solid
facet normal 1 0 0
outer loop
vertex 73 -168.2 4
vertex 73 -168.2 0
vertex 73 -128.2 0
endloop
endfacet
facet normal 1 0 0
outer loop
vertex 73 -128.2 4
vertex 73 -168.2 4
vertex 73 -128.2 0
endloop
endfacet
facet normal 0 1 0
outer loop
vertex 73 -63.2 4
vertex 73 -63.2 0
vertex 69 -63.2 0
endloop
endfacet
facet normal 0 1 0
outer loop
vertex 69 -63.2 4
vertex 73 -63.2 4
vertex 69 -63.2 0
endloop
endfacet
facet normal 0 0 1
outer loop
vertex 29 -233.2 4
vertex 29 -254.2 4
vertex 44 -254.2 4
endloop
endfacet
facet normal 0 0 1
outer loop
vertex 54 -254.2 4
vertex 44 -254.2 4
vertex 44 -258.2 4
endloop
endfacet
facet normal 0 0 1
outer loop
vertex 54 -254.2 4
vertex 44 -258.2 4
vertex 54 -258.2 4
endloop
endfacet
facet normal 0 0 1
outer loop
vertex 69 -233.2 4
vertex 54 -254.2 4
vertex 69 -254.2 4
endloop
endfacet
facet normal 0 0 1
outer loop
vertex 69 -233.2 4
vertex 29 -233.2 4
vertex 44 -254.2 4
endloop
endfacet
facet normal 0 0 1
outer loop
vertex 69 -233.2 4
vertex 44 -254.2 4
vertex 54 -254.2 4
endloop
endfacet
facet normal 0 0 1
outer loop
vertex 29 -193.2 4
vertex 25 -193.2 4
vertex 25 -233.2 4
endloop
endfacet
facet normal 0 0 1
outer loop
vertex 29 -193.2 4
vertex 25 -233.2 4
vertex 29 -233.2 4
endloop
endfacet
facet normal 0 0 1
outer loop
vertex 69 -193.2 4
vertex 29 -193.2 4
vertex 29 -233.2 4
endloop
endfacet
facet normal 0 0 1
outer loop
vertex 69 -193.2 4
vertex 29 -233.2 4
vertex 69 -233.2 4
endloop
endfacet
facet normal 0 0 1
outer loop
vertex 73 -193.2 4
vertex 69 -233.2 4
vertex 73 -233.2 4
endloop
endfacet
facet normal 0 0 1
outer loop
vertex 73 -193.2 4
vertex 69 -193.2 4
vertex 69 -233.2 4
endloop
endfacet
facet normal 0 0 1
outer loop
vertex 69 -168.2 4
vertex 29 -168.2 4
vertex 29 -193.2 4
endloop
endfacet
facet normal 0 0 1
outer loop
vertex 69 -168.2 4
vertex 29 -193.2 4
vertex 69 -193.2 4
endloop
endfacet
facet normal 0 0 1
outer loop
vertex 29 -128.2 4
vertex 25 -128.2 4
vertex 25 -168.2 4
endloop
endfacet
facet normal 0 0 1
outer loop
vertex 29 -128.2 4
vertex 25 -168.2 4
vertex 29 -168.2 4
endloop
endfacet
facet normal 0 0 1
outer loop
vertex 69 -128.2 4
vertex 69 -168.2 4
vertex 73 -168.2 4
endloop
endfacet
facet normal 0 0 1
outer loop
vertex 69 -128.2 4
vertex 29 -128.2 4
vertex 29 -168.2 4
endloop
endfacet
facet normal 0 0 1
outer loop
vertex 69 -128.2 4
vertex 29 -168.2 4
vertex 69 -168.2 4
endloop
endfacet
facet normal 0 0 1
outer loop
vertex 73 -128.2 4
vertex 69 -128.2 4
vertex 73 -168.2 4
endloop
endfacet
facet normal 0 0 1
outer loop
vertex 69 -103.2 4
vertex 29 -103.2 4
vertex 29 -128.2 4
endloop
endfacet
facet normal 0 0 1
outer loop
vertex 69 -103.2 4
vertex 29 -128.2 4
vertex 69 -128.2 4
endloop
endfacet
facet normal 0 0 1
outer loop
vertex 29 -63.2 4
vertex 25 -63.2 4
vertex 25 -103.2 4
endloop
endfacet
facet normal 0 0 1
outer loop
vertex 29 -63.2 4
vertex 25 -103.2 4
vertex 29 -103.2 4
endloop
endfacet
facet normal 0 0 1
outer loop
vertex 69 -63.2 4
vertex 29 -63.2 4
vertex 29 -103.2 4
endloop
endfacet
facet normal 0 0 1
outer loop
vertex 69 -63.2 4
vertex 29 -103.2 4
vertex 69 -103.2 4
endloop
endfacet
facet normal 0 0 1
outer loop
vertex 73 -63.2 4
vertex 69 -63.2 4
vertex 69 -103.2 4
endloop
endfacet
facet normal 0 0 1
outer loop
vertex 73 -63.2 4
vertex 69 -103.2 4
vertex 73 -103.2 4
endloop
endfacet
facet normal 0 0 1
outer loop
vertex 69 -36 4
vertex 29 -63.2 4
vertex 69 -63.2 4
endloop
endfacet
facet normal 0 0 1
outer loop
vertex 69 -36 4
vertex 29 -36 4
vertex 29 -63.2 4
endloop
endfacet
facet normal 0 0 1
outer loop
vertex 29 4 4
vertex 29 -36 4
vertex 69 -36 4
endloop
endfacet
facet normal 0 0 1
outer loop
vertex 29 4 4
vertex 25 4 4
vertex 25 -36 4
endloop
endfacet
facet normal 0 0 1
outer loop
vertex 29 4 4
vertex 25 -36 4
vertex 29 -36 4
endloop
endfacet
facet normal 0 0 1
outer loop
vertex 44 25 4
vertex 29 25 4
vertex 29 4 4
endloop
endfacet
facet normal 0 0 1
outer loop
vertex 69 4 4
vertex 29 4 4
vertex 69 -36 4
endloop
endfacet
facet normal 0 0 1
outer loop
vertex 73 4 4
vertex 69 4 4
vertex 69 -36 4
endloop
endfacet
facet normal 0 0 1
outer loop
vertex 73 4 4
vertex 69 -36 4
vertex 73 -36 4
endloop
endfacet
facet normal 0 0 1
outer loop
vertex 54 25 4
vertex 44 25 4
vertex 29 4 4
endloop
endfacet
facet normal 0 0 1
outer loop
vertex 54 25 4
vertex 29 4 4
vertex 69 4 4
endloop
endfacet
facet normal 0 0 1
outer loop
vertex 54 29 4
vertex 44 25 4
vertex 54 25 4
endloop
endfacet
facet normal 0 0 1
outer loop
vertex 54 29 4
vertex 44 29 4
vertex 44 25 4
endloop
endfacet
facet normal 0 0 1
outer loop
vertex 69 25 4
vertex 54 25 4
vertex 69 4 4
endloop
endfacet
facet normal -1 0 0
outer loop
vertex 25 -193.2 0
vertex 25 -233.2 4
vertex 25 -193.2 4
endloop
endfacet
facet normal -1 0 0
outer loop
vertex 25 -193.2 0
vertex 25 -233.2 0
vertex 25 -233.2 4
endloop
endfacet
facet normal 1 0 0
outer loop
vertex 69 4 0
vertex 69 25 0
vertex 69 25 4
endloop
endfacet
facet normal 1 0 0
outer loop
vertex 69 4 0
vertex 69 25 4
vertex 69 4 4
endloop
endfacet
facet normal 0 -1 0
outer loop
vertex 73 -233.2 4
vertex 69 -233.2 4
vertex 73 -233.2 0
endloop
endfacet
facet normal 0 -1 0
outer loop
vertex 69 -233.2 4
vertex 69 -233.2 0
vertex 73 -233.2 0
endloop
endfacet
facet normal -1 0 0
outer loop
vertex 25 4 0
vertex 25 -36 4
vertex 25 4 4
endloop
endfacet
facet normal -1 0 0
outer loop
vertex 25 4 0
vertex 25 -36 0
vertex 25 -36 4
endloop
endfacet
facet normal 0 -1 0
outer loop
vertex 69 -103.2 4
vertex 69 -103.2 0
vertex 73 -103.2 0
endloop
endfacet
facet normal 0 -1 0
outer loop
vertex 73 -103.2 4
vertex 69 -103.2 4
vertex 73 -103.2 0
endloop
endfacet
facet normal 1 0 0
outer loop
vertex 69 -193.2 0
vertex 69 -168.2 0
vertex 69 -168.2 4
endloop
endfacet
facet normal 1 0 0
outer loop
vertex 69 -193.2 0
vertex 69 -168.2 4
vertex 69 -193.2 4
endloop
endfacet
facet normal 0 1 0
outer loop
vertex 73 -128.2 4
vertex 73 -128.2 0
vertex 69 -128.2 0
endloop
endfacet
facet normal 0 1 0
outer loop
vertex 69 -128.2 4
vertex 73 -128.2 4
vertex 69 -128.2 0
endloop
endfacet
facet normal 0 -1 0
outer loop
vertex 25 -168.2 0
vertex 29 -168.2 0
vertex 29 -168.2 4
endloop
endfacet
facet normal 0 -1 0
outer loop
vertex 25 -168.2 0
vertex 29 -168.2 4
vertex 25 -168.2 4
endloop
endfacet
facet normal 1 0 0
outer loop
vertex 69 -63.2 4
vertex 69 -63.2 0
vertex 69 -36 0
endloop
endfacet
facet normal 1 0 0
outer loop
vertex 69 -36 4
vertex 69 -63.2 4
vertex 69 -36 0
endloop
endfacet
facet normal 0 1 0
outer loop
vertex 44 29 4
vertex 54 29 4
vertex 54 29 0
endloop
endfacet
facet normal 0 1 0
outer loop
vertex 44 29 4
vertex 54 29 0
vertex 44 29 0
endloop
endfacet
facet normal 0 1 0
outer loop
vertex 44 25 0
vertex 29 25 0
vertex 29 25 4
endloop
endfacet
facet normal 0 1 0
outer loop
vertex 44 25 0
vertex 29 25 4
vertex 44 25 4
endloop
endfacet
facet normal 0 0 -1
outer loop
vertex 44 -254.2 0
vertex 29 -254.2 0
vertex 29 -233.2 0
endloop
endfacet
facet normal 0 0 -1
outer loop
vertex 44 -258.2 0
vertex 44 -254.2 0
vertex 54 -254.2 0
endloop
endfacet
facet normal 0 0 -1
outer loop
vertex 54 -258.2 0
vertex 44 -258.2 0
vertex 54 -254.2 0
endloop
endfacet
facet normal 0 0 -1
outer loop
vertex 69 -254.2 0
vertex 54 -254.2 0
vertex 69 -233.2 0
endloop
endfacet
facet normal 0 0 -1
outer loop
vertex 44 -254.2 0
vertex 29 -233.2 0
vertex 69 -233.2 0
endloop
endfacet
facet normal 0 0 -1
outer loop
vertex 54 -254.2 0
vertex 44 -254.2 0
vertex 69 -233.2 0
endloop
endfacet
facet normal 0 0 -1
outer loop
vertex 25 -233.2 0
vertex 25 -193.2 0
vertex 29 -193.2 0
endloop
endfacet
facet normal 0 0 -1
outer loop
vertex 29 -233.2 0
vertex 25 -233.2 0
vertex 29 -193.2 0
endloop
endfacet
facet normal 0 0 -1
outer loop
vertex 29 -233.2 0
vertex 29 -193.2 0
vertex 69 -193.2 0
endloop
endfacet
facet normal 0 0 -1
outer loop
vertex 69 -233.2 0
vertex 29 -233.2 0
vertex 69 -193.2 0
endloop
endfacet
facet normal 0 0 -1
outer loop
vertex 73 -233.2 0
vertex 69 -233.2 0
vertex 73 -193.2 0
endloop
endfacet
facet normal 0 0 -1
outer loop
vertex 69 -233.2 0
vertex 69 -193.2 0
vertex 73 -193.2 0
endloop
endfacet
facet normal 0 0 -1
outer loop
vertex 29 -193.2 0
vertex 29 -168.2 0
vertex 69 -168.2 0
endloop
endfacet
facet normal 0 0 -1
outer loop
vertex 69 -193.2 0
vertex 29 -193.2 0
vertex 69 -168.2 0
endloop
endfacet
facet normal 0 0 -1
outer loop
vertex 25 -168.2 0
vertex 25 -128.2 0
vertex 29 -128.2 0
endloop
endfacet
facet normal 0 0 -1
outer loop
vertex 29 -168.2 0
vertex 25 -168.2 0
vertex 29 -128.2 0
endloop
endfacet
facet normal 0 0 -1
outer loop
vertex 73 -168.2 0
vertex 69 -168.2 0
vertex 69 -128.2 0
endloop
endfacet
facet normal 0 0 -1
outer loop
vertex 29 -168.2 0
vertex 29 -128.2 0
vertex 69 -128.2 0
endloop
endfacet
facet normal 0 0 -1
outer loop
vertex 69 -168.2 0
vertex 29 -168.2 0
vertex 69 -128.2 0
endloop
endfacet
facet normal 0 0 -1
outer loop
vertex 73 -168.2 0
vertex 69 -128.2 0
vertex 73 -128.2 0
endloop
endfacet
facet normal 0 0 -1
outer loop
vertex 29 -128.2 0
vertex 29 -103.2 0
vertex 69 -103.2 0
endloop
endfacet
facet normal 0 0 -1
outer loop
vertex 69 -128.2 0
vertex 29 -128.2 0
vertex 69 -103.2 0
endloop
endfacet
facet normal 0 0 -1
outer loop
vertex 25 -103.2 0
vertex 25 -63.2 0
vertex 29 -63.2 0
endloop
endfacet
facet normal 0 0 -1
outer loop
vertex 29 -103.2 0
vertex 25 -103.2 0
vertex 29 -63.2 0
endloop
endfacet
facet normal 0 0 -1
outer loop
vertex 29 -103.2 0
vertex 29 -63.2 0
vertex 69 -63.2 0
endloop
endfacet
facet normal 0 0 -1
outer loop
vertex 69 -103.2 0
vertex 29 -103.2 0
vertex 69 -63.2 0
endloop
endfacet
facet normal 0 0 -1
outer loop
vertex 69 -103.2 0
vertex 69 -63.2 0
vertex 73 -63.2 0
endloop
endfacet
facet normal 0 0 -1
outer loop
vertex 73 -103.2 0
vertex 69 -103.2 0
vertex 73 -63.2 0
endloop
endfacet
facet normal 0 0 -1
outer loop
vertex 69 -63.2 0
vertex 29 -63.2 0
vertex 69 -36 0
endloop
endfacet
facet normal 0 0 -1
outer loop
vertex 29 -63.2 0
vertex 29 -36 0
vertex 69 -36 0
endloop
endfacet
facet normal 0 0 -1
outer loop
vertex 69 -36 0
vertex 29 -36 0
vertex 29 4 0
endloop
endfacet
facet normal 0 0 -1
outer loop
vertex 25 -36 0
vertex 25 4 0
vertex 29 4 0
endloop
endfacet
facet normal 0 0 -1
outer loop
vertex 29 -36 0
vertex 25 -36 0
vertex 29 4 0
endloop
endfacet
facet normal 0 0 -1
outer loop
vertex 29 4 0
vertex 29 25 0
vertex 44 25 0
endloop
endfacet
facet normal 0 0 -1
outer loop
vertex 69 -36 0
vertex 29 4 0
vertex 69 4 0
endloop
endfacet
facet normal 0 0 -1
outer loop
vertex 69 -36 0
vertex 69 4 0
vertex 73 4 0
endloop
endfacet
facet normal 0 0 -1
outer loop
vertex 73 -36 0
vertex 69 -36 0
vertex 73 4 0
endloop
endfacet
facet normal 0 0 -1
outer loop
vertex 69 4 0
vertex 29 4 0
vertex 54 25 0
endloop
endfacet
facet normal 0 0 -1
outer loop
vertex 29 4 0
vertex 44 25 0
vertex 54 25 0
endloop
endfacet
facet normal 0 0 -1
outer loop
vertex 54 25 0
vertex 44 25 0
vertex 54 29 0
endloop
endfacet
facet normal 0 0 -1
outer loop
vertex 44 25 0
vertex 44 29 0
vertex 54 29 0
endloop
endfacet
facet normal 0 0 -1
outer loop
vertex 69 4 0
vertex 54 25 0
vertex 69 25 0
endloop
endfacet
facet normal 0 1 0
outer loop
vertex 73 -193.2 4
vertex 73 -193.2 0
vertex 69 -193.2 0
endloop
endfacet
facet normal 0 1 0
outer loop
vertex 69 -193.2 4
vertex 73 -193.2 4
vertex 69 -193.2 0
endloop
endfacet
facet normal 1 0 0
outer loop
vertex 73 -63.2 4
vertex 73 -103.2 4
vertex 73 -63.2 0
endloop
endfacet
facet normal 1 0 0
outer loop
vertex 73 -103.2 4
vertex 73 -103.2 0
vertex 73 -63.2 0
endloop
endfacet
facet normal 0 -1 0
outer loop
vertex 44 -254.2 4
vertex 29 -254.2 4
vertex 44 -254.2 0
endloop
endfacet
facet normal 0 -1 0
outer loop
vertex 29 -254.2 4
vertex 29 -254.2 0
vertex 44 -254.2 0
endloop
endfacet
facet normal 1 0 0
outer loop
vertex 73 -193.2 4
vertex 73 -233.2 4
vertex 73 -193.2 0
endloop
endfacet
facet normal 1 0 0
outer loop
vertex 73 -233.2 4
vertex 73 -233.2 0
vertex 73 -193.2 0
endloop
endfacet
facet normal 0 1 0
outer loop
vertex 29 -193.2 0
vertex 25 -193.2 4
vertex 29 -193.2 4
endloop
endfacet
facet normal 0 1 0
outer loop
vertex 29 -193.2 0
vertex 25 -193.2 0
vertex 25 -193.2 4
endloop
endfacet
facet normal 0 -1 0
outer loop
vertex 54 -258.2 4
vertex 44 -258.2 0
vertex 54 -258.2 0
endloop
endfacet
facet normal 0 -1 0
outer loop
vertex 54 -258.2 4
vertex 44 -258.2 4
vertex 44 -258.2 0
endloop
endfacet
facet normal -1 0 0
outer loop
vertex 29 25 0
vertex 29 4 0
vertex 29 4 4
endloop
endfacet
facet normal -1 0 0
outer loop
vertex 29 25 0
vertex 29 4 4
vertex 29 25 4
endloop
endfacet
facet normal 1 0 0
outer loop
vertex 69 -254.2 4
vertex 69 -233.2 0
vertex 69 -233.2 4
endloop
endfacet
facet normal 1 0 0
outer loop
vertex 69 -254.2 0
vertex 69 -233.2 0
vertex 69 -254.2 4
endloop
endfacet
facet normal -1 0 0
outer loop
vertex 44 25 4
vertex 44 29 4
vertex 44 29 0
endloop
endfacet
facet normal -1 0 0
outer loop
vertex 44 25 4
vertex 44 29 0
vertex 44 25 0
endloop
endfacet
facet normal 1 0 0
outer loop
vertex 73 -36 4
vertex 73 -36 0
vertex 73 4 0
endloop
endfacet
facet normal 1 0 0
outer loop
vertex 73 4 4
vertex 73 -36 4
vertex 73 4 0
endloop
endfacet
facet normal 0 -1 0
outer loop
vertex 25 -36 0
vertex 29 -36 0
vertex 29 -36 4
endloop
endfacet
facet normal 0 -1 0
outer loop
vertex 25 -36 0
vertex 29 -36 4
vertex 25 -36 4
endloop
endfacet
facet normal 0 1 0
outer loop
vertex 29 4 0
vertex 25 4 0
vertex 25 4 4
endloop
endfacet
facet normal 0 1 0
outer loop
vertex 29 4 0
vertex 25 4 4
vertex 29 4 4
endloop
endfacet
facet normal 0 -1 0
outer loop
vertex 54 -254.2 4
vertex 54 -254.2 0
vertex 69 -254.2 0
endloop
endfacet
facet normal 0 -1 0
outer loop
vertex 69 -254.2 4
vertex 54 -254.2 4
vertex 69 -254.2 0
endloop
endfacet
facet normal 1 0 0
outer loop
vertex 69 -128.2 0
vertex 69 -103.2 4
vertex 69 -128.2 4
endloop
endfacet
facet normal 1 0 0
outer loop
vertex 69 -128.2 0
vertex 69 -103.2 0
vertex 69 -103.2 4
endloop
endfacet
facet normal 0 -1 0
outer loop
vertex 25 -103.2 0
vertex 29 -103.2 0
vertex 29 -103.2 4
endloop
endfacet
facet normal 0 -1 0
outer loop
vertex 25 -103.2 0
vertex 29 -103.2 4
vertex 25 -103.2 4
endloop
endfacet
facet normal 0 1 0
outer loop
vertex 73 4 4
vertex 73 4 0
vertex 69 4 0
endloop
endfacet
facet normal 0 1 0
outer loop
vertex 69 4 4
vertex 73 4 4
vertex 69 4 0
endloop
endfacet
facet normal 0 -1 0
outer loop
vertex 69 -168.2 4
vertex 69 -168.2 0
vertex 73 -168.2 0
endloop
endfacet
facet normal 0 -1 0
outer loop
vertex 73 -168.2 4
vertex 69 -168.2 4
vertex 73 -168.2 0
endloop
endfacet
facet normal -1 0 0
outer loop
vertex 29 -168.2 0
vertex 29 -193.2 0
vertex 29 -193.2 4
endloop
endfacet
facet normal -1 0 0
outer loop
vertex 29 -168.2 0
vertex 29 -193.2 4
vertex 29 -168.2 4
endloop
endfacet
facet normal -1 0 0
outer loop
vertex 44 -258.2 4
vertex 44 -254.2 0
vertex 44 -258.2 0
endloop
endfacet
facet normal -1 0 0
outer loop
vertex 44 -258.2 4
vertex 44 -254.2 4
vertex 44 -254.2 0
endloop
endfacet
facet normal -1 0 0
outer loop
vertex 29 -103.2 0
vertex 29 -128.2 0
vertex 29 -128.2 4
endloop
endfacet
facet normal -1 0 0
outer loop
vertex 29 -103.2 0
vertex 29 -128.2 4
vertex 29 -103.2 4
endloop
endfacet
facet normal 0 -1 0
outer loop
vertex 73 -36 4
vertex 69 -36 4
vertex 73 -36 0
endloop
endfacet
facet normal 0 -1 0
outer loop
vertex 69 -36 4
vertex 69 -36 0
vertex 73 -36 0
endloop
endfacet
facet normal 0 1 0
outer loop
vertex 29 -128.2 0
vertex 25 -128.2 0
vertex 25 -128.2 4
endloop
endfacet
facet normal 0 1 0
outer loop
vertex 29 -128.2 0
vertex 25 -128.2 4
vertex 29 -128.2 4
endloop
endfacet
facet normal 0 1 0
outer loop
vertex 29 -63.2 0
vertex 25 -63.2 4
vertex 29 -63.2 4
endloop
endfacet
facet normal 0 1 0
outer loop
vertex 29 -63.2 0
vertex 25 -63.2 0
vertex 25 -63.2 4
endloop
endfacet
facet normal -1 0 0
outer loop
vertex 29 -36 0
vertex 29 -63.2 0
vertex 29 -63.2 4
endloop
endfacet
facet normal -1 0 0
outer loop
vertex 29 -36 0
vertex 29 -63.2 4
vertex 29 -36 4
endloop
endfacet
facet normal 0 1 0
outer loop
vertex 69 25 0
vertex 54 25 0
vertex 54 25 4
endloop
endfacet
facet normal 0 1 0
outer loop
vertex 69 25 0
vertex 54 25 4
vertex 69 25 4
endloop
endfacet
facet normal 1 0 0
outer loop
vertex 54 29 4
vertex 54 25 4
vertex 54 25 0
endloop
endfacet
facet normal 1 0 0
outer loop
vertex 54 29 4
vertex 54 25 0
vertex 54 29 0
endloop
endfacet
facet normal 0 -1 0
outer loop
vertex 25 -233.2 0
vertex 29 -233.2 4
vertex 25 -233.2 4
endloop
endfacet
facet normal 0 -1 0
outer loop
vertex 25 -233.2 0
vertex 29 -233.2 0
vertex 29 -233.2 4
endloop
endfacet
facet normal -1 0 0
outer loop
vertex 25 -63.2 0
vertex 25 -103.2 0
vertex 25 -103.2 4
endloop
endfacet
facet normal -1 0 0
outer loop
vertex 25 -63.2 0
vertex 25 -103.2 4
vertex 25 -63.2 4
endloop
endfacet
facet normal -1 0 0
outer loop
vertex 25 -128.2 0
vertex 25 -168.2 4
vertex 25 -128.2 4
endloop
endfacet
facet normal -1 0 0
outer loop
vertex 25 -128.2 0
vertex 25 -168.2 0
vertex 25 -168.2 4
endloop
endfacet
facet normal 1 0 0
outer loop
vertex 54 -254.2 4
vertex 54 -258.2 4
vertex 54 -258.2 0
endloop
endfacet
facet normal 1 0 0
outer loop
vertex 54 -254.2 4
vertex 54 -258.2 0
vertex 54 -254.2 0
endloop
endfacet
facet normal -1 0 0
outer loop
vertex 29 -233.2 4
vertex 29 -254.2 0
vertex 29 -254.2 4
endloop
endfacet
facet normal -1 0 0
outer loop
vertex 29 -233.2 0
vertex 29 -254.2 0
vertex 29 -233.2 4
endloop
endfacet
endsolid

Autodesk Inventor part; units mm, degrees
ref_plane "YZ Plane" through (0, 0, 0) normal (1, 0, 0) x (0, 1, 0)
ref_plane "XZ Plane" through (0, 0, 0) normal (0, 1, 0) x (-1, 0, 0)
sketch "Sketch1" plane through (0, 0, 0) normal (0, 0, 1) x (1, 0, 0)
  line L0 (29, -258.2) -> (29, -233.2)
  line L1 (29, -233.2) -> (25, -233.2)
  line L2 (25, -233.2) -> (25, -193.2)
  line L3 (25, -193.2) -> (29, -193.2)
  line L4 (29, -193.2) -> (29, -168.2)
  line L5 (29, -168.2) -> (25, -168.2)
  line L6 (25, -168.2) -> (25, -128.2)
  line L7 (25, -128.2) -> (29, -128.2)
  line L8 (29, -128.2) -> (29, -103.2)
  line L9 (29, -103.2) -> (25, -103.2)
  line L10 (25, -103.2) -> (25, -63.2)
  line L11 (25, -63.2) -> (29, -63.2)
  line L12 (29, -63.2) -> (29, -36)
  line L13 (29, -36) -> (25, -36)
  line L14 (25, -36) -> (25, 4)
  line L15 (25, 4) -> (29, 4)
  line L16 (29, 4) -> (29, 29)
  line L17 (29, 29) -> (29, 25)
  line L18 (29, 25) -> (69, 25)
  line L19 (29, -258.2) -> (29, -254.2)
  line L20 (29, -254.2) -> (69, -254.2)
  line L21 (49, 25) -> (49, 50.1757)
  line L22 (69, -63.2) -> (69, -36)
  line L23 (73, -36) -> (73, 4)
  line L24 (69, -36) -> (73, -36)
  line L25 (73, 4) -> (69, 4)
  line L26 (73, -233.2) -> (73, -193.2)
  line L27 (73, -193.2) -> (69, -193.2)
  line L28 (69, -233.2) -> (73, -233.2)
  line L29 (69, -168.2) -> (73, -168.2)
  line L30 (73, -168.2) -> (73, -128.2)
  line L31 (73, -63.2) -> (69, -63.2)
  line L32 (69, -103.2) -> (73, -103.2)
  line L33 (73, -128.2) -> (69, -128.2)
  line L34 (73, -103.2) -> (73, -63.2)
  line L35 (69, 25) -> (69, 4)
  line L36 (69, -36) -> (69, -63.2)
  line L37 (69, -103.2) -> (69, -128.2)
  line L38 (69, -168.2) -> (69, -193.2)
  line L39 (69, -233.2) -> (69, -254.2)
  point P0 (0, 0)
  dimension "d1" = 40
  dimension "d2" = 4
  dimension "d3" = 40
  dimension "d4" = 40
  dimension "d5" = 40
  dimension "d6" = 40
  dimension "d7" = 279.2
extrude "Extrusion1" add sketch "Sketch1" along normal blind 4
sketch "Sketch2" plane through (0, 0, 4) normal (0, 0, 1) x (1, 0, 0)
  line L0 (25, -63.2) -> (25, -103.2) projected
  line L1 (25, -103.2) -> (29, -103.2) projected
  line L2 (29, -103.2) -> (29, -128.2) projected
  line L3 (29, -128.2) -> (25, -128.2) projected
  line L4 (25, -128.2) -> (25, -168.2) projected
  line L5 (25, -168.2) -> (29, -168.2) projected
  line L6 (29, -168.2) -> (29, -193.2) projected
  line L7 (29, -193.2) -> (25, -193.2) projected
  line L8 (25, -193.2) -> (25, -233.2) projected
  line L9 (25, -233.2) -> (29, -233.2) projected
  line L10 (29, -233.2) -> (29, -254.2) projected
  line L11 (29, -254.2) -> (69, -254.2) projected
  line L12 (69, -254.2) -> (69, -233.2) projected
  line L13 (69, -233.2) -> (73, -233.2) projected
  line L14 (73, -233.2) -> (73, -193.2) projected
  line L15 (73, -193.2) -> (69, -193.2) projected
  line L16 (69, -193.2) -> (69, -168.2) projected
  line L17 (69, -168.2) -> (73, -168.2) projected
  line L18 (73, -168.2) -> (73, -128.2) projected
  line L19 (73, -128.2) -> (69, -128.2) projected
  line L20 (69, -128.2) -> (69, -103.2) projected
  line L21 (69, -103.2) -> (73, -103.2) projected
  line L22 (73, -103.2) -> (73, -63.2) projected
  line L23 (73, -63.2) -> (69, -63.2) projected
  line L24 (69, -63.2) -> (69, -36) projected
  line L25 (69, -36) -> (73, -36) projected
  line L26 (73, -36) -> (73, 4) projected
  line L27 (73, 4) -> (69, 4) projected
  line L28 (69, 4) -> (69, 25) projected
  line L29 (69, 25) -> (29, 25) projected
  line L30 (29, 25) -> (29, 4) projected
  line L31 (29, 4) -> (25, 4) projected
  line L32 (25, 4) -> (25, -36) projected
  line L33 (25, -36) -> (29, -36) projected
  line L34 (29, -36) -> (29, -63.2) projected
  line L35 (29, -63.2) -> (25, -63.2) projected
  line L36 (44, 25) -> (54, 25)
  line L37 (54, 25) -> (54, 29)
  line L38 (54, 29) -> (44, 29)
  line L39 (44, 29) -> (44, 25)
  point P0 (0, 0)
  point P1 (49, 25)
  dimension "d10" = 10
  dimension "d11" = 4
extrude "Extrusion2" add sketch "Sketch2" against normal blind 4 contours L39 L38 L37 L29
ref_plane "Work Plane1" through (29, -114.6, 0) normal (0, -1, 0) x (1, 0, 0)
mirror "Mirror1" about plane through (29, -114.6, 0) normal (0, -1, 0) of "Extrusion2"
equation "\"d3\" = D"
equation "\"d4\" = D"
equation "\"d5\" = D"
equation "\"d6\" = D"
equation "\"d10\" = B"
equation "\"D\" = 40"
equation "\"B\" = 10"
properties part number "F3"
